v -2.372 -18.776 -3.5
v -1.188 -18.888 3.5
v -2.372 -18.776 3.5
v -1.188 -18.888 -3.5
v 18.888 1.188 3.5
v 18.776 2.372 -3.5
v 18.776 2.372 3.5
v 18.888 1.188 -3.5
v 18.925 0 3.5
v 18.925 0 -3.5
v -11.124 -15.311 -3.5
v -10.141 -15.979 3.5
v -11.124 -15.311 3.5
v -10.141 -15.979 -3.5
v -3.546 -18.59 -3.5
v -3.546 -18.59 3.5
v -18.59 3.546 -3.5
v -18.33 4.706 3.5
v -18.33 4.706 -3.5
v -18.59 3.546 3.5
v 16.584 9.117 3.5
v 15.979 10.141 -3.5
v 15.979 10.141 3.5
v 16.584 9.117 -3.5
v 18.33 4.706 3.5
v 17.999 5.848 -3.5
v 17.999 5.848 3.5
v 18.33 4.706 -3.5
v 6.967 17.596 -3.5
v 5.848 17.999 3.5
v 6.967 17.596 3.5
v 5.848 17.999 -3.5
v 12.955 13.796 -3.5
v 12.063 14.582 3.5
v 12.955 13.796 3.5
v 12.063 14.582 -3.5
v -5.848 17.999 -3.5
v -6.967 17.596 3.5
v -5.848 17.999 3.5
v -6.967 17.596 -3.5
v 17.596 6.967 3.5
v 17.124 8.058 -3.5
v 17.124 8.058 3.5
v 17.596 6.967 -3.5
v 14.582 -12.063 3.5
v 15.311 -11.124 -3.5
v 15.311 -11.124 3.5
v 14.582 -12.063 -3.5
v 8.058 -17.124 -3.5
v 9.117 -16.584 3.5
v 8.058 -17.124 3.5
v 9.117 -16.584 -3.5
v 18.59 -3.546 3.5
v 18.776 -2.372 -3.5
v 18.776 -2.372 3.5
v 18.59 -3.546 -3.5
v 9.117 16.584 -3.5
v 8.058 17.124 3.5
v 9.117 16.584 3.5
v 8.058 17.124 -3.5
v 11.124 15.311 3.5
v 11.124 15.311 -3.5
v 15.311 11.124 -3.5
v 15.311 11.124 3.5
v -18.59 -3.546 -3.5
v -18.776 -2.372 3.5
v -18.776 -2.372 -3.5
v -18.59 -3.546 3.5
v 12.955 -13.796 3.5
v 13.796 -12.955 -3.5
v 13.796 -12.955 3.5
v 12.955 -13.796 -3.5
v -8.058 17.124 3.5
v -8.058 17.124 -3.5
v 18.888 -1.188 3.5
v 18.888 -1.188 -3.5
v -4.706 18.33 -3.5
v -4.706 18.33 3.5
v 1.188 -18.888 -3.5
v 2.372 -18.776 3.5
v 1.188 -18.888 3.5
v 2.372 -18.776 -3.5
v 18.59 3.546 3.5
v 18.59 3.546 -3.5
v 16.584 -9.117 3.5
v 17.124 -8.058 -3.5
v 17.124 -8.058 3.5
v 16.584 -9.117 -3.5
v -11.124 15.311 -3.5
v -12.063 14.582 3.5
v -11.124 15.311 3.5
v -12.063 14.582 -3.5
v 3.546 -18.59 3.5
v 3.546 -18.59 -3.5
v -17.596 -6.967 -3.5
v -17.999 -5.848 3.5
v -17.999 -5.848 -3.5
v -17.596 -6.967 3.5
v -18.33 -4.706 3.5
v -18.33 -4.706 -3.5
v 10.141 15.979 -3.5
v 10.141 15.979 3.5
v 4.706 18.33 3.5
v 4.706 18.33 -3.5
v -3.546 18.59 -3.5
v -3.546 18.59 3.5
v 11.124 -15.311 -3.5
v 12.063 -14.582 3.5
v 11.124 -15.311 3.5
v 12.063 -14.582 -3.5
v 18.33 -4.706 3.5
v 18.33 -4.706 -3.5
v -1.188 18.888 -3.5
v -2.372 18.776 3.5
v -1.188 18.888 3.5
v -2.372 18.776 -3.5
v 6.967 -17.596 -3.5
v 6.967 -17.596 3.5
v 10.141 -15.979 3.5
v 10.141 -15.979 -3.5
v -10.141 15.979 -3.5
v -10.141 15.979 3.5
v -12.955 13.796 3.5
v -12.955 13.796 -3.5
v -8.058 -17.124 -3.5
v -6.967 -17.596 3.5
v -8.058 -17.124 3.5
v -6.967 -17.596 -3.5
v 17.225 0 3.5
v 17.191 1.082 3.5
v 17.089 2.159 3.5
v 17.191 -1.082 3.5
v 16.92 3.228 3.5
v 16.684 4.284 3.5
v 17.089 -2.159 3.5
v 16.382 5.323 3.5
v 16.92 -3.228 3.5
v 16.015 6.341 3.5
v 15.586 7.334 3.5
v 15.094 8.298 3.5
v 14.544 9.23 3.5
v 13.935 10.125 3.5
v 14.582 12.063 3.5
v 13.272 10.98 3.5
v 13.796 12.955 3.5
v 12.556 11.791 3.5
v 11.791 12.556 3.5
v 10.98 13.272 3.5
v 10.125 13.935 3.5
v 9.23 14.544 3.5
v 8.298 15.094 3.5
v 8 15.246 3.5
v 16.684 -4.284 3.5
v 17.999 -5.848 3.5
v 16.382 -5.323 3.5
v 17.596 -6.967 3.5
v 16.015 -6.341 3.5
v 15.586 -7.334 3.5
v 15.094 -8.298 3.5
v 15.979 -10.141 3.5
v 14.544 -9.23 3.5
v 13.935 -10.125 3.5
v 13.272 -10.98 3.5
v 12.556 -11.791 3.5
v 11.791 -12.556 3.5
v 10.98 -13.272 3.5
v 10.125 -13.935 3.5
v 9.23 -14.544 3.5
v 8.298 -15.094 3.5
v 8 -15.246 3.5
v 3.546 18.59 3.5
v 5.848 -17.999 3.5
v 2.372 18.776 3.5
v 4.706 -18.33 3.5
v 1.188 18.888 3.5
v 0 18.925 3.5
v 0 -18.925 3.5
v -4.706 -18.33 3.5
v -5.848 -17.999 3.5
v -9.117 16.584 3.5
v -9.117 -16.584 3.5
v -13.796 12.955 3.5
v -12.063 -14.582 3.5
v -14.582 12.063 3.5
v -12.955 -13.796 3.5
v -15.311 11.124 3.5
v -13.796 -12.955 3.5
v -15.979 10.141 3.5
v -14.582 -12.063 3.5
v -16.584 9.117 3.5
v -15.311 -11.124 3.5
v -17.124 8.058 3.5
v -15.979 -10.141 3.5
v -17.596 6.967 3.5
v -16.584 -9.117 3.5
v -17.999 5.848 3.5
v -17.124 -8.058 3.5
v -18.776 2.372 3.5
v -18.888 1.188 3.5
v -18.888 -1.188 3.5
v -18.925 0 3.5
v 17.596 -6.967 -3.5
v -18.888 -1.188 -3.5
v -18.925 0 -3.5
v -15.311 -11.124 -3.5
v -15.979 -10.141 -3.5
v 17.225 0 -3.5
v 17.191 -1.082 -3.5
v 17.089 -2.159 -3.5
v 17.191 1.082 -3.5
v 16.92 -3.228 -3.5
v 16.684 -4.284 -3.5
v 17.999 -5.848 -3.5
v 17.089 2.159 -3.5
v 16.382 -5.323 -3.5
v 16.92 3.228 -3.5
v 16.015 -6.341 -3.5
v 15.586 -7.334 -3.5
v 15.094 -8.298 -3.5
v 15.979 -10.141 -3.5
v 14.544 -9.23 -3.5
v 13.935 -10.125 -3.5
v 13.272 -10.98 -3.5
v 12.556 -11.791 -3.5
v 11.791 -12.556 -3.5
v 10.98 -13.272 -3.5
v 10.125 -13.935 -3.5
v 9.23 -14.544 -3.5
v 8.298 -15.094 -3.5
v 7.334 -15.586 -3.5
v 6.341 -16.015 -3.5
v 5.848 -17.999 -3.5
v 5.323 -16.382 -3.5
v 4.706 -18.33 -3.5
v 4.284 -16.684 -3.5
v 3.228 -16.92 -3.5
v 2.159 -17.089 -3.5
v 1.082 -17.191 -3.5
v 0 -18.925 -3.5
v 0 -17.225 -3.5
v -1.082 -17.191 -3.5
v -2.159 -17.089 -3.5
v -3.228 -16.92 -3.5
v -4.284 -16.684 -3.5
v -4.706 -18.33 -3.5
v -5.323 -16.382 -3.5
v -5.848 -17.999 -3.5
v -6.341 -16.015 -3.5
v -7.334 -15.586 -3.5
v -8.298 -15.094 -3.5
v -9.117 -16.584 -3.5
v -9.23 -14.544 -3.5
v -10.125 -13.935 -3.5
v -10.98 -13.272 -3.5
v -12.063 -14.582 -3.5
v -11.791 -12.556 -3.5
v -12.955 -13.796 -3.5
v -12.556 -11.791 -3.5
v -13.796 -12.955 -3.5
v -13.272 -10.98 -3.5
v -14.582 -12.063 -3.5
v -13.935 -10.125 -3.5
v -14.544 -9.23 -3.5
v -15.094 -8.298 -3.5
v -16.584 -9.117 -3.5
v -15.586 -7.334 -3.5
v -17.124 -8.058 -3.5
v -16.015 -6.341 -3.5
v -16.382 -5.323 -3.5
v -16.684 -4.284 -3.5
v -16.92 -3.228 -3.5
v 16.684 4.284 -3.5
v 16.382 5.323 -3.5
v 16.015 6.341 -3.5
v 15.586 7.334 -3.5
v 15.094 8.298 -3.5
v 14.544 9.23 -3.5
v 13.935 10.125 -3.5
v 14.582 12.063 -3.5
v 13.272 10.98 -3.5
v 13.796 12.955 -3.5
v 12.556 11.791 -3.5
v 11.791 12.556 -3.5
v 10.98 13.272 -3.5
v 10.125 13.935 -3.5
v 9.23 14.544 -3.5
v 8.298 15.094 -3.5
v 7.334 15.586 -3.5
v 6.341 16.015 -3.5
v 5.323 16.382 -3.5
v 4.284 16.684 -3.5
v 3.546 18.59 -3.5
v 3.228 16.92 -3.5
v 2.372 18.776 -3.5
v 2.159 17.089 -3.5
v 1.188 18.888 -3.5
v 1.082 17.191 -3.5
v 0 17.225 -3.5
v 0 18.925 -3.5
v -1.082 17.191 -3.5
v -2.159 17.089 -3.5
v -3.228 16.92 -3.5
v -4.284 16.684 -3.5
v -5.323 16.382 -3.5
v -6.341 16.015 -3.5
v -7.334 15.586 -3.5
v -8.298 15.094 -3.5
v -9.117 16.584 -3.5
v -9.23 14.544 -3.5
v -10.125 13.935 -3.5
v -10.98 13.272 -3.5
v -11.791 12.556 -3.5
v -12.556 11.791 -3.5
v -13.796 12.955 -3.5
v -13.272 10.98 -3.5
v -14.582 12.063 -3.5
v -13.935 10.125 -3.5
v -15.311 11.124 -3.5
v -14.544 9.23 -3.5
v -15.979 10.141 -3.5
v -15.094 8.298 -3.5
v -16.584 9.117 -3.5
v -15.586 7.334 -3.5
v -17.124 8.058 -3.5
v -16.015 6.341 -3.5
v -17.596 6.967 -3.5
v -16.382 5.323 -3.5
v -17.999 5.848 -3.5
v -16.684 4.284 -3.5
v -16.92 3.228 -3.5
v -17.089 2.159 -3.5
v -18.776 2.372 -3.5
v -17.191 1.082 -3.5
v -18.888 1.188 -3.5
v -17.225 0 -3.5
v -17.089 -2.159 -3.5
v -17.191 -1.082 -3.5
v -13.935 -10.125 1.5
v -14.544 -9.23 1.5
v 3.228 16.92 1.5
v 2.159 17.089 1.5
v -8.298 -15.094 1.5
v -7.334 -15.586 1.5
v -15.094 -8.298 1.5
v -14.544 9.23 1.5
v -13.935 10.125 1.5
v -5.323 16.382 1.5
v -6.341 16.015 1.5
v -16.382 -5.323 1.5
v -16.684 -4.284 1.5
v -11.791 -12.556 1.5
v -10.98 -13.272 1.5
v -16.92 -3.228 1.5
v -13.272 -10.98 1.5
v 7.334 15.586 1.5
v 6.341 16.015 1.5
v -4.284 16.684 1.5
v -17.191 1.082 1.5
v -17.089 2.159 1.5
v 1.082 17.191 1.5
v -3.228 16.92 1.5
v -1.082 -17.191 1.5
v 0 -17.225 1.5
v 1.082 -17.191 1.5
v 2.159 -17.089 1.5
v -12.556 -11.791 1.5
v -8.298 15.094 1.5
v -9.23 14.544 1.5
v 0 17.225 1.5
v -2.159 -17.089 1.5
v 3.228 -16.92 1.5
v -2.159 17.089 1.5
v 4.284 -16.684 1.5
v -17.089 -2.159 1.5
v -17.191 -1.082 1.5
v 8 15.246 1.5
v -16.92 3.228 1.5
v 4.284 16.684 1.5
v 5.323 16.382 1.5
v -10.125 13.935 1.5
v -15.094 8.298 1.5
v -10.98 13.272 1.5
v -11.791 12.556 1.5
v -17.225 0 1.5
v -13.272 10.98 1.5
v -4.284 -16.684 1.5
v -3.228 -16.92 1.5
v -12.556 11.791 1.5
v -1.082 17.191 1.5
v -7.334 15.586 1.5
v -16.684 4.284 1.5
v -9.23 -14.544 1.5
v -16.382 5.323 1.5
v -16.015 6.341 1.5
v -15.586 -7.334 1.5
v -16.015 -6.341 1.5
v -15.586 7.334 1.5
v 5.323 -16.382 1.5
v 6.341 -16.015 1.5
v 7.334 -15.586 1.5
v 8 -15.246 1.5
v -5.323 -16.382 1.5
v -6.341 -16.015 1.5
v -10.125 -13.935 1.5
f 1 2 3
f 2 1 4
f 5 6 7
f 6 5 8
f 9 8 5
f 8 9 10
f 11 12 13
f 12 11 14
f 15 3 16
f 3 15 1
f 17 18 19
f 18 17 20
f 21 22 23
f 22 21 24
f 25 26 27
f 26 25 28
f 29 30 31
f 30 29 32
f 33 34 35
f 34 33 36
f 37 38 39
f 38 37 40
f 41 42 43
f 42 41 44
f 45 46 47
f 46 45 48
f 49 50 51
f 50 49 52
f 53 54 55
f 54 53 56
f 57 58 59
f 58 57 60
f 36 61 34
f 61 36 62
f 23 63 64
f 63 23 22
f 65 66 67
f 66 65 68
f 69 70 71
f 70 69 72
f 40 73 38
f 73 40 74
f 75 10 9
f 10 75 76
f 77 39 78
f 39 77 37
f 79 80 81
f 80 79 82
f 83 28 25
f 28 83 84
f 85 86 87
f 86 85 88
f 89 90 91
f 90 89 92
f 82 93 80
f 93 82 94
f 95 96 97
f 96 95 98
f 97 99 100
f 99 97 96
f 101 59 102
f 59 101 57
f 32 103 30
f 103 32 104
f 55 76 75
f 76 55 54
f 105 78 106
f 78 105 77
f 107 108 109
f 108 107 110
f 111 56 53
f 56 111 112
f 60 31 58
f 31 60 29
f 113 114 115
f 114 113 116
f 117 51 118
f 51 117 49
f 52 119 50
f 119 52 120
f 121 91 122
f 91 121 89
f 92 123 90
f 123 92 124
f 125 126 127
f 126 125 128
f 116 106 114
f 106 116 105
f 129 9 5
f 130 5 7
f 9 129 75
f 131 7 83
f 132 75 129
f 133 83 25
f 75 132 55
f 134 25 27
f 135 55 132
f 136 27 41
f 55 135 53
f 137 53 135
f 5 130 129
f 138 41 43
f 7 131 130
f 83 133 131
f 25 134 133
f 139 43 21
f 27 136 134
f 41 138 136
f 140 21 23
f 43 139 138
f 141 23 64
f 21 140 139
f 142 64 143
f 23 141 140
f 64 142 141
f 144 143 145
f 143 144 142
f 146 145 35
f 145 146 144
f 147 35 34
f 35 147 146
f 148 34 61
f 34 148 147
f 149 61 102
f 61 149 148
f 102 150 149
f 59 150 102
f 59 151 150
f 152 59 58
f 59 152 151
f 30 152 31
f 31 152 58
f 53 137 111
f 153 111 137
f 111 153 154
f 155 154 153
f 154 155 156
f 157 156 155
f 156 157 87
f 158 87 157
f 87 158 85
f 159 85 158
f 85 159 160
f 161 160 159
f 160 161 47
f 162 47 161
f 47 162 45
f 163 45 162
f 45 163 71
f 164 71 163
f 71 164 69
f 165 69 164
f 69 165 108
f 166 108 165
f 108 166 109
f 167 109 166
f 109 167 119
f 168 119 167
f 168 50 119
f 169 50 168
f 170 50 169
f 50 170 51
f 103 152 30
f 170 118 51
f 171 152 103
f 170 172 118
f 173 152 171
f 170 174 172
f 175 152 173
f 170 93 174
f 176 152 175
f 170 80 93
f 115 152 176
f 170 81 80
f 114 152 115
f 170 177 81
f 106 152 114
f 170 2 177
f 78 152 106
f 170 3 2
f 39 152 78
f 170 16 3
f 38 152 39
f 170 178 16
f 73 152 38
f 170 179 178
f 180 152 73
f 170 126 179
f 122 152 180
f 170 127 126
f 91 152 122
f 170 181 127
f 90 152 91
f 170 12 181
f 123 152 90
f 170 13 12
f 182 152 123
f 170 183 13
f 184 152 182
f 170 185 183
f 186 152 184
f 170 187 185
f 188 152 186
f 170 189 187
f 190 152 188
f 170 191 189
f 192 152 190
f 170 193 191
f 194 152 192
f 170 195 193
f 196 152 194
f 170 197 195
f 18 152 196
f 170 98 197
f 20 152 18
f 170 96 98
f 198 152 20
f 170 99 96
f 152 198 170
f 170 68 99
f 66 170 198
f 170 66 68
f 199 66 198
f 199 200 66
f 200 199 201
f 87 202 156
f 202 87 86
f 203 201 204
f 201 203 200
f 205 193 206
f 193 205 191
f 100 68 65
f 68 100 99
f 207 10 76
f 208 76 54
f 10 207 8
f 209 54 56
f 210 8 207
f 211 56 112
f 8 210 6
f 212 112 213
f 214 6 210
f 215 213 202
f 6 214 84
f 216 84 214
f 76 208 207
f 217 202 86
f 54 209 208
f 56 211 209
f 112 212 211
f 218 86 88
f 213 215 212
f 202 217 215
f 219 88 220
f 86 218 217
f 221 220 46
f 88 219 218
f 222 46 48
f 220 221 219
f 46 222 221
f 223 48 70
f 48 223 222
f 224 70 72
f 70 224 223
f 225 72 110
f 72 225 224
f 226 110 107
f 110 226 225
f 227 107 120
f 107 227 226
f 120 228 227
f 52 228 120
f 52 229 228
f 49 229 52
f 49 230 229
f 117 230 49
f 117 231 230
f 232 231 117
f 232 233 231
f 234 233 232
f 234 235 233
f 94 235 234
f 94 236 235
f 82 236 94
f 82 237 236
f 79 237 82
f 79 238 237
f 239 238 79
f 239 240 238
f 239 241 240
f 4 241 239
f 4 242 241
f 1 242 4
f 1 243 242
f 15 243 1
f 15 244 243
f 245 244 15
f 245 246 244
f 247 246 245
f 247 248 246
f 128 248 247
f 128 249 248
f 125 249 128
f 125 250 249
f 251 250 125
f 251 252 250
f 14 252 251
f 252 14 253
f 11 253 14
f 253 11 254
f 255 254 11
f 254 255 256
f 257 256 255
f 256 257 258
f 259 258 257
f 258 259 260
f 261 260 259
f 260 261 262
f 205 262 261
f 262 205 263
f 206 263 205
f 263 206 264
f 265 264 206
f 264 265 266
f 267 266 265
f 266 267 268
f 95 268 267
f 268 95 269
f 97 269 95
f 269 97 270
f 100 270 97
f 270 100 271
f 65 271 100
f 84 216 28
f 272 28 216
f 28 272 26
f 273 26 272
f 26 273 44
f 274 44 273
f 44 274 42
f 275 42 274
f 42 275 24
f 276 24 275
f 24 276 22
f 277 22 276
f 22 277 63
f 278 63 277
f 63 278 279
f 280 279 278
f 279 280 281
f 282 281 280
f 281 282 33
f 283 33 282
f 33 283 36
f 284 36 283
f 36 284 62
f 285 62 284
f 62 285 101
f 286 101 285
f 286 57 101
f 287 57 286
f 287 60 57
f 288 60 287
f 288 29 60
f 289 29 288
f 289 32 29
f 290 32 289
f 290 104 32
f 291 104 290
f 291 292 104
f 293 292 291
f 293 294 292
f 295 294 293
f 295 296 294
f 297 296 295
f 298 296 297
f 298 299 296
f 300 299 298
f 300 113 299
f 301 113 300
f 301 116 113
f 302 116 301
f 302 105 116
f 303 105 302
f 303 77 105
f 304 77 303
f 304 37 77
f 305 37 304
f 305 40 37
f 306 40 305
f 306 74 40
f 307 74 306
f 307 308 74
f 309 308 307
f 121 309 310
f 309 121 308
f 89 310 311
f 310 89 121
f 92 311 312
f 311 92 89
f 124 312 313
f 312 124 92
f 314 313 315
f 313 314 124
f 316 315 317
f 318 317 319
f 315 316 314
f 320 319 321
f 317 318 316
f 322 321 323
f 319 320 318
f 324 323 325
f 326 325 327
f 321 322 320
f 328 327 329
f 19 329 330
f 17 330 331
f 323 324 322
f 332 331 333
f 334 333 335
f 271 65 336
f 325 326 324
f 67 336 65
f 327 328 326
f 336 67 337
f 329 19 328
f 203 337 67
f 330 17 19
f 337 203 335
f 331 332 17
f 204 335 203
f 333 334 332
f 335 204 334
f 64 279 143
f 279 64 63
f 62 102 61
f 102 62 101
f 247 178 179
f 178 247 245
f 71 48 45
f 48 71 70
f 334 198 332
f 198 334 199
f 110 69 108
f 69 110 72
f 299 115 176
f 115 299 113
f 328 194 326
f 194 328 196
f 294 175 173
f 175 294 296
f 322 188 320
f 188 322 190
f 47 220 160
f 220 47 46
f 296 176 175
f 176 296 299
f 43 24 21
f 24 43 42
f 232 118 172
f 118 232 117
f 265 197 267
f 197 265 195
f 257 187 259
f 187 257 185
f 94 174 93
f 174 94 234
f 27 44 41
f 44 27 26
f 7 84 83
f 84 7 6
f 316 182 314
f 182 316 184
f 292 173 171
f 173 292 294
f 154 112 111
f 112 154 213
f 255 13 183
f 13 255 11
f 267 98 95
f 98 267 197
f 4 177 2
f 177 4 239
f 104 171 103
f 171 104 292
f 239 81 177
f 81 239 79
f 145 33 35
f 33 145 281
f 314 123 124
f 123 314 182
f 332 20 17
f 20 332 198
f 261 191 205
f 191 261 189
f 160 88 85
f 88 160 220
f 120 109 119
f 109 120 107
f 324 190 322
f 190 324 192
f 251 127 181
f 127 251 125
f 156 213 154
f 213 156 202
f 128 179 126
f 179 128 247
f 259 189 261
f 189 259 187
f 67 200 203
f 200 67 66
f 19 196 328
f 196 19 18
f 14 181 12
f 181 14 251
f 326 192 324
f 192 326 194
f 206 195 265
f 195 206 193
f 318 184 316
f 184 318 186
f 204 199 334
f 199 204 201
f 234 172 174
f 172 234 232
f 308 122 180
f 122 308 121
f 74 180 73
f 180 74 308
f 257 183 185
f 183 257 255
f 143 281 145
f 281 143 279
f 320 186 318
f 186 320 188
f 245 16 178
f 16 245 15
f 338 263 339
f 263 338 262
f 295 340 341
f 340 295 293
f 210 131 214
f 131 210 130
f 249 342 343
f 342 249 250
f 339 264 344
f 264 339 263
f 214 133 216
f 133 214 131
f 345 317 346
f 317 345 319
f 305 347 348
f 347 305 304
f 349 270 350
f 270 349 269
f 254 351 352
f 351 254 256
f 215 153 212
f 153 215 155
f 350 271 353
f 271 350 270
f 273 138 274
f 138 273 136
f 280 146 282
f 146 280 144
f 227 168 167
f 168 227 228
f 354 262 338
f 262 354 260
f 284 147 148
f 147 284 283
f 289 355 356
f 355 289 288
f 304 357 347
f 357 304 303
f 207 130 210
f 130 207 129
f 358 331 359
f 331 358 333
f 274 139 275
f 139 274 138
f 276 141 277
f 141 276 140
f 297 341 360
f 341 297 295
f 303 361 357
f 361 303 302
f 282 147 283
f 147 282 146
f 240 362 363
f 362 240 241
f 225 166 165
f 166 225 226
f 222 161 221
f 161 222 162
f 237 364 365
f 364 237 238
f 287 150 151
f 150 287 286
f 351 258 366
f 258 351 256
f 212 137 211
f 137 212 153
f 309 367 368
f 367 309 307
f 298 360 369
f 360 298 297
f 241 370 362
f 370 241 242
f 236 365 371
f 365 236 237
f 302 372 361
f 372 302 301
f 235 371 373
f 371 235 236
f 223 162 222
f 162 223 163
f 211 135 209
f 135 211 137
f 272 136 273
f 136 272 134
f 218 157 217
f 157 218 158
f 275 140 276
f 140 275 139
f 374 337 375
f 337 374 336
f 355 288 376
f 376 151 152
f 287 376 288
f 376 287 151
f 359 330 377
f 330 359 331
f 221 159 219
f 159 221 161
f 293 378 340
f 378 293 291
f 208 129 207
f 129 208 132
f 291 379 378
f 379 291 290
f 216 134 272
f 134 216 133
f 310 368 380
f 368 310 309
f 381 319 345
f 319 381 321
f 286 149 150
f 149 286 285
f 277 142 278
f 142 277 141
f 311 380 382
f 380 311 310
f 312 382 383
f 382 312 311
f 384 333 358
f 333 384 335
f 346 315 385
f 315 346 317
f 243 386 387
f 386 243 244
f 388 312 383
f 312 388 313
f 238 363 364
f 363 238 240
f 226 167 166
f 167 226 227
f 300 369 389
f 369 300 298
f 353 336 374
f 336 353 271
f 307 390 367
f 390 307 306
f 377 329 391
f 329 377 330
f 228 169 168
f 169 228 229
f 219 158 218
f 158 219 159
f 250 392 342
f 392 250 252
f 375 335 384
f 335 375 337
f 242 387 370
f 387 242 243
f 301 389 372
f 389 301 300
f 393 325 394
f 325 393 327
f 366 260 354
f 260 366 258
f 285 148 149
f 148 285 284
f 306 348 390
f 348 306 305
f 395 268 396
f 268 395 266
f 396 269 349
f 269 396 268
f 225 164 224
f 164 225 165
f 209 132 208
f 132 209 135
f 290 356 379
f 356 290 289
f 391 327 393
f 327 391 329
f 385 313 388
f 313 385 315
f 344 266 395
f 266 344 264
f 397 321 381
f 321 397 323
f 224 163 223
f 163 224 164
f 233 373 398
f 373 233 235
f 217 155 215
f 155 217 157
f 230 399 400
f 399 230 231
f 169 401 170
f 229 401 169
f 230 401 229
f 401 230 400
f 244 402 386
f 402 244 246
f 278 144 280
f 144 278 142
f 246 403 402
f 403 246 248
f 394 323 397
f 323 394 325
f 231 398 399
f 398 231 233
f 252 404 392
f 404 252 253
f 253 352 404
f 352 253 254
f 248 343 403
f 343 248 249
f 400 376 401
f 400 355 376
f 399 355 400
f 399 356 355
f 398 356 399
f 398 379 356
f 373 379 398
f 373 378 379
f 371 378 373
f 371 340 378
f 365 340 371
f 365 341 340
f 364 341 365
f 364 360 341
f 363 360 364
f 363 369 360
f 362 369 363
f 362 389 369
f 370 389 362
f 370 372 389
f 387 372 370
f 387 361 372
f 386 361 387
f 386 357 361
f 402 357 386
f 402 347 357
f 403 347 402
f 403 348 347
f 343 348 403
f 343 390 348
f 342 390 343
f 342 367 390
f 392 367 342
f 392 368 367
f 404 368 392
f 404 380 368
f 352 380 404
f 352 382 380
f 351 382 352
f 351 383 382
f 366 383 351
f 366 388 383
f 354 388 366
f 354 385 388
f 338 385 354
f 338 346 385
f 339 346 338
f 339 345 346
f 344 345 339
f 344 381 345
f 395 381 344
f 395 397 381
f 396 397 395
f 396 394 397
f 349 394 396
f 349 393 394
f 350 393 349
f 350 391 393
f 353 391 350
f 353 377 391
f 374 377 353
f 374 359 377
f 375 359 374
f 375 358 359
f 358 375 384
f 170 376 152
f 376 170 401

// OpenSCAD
include <./ready.scad>;

OUTER_D = 44.45;
CAP_D = 57.15;
WALL_THICKNESS = 3;
LENGTH = 95.25;
$fn = 100;

module rail_neg () {
    cube([17.4, 4, 120], center = true);
    cube([35, 4, 95], center = true);
    
    translate([17.4, -1.5, 0]) cube([17.5, 4, 96], center = true);
    translate([-17.4, -1.5, 0]) cube([17.5, 4, 96], center = true);
}

module rail_guide () {
    translate([10.2, 0, 0]) cube([3, 4, 72], center = true);
    translate([-10.2, 0, 0]) cube([3, 4, 72], center = true);
    translate([10.2 - .6, 1.5, 0]) cube([4.3, 1, 72], center = true);
    translate([-10.2 + .6, 1.5, 0]) cube([4.3, 1, 72], center = true);
}

module fan_holes () {
        dist = 29;
        cylinder(r = 34/2, h = 500, center = true);
        translate([dist/2, dist/2, 0]) cylinder(r = 2.9/2, h = 500, center = true);
        translate([dist/2, -dist/2, 0]) cylinder(r = 2.9/2, h = 500, center = true);
        //translate([-dist/2, -dist/2, 0]) cylinder(r = 2.9/2, h = 500, center = true);
        translate([-dist/2 + 2.1, -dist/2 + 2.1, 0]) rotate([0, 0, 45]) cube([5, 5, 500], center = true);
        translate([-dist/2, dist/2, 0]) cylinder(r = 2.9/2, h = 500, center = true);
}

module light_holder (DECOYS = false) {
	//cap
    $fn = 200;
    difference () {
        translate([0,0,(LENGTH / 2) + (WALL_THICKNESS / 2) ]) {
            cylinder(r = CAP_D / 2, h = WALL_THICKNESS, center = true);
        }
        translate([0, 22, 0]) rail_neg();
        fan_holes();
    }
     
	//tube
	difference () {
		cylinder(r = OUTER_D / 2, h = LENGTH, center = true);
		cylinder(r = (OUTER_D / 2) - WALL_THICKNESS, h = LENGTH + 10, center = true);
        translate([0, 22, 0]) rail_neg();
        //light
        translate([0, 20, -41 + 6]) rotate([90, 0, 0]) cylinder(r = 13/2, h = 25, center = true);
	}
	//rail
    translate([0, 20.5, 12]) rail_guide();
    if (DECOYS) {
        decoys(36, 48.6, 6);
    }
}
module rail (DECOYS = false) {
    difference () {
       union () {
        translate([0, 20.7, 2.4]) cube([17, 1.3, 100], center = true);
        translate([0, 21.9, 2.4]) cube([14.2, 2.8, 100], center = true);
       }
       translate([0, 20, -41 + 6]) rotate([90, 0, 0]) cylinder(r = 9/2, h = 25, center = true);
       translate([0, 23.4, -41 + 6]) rotate([90, 0, 0]) cylinder(r = 13/2, h = 3, center = true);
    }
   translate([0, 24, 52.2]) cube([24, 8, 3], center = true);
    if (DECOYS) {
        translate([0, 0, -35]) rotate([90, 45, 0]) decoys(25, -22.05);
        translate([0, 0, 42]) rotate([90, 45, 0]) decoys(25, -22.05);
    }
};

module baffle (DECOYS = false) {
    //print 3 of these
    difference () {
		cylinder(r = (OUTER_D / 2) - WALL_THICKNESS - 0.3, h = 7, center = true);
        cylinder(r = (OUTER_D / 2) - WALL_THICKNESS - 2, h = 8, center = true);
	}
    difference () {
        translate([0, 0, 2.5]) cylinder(r = (OUTER_D / 2) - WALL_THICKNESS - 0.3, h = 2, center = true);
        translate([58, 0, 0]) cube([100, 100, 100], center = true);
    }
    if (DECOYS) {
            decoys(28, 1.5, 6);
    }
}

module LED_mount () {
    $fn = 200;
    difference () {
        cylinder(r = (OUTER_D / 2) - WALL_THICKNESS - 0.015, h = 10, center = true);
        cylinder(r = (OUTER_D / 2) - WALL_THICKNESS - 0.015 - 2, h = 11, center = true);
        translate([0, (OUTER_D / 2) +4, 0]) cube([OUTER_D, OUTER_D, OUTER_D], center = true);
    }
    translate ([0, 0, -4.5]) {
        intersection() {
            difference () {
                cylinder(r = (OUTER_D / 2) - WALL_THICKNESS - 0.015, h = 15, center = true);
                cylinder(r = (OUTER_D / 2) - WALL_THICKNESS - 0.015 - 2, h = 16, center = true);
            }
           translate ([0, -17, -1]) cube([7, 7, 15], center = true); 
        }
    }
    difference () {
        union () {
            difference () {
                translate([0, -6, 0]) cube([OUTER_D - 8, 2, 10], center = true);
                translate([OUTER_D / 2 - 3.5, -6.5, 0]) rotate([0, 0, 60]) cube([4, 2, 10], center = true);
                translate([-OUTER_D / 2 + 3.5, -6.5, 0]) rotate([0, 0, -60]) cube([4, 2, 10], center = true);
            }
            translate([7.5, -5, 0]) cube([4, 4, 10], center = true);
            translate([-7.5, -5, 0]) cube([4, 4, 10], center = true);
        }
        translate([7.5, 0, 0]) rotate([90, 0, 0]) cylinder(r = 1, h = 40, center = true);
        translate([0, 0, 0]) rotate([90, 0, 0]) cylinder(r = 1, h = 40, center = true);
        translate([-7.5, 0, 0]) rotate([90, 0, 0]) cylinder(r = 1, h = 40, center = true);
    }
    translate([0, -8, 0]) scale([1.5, 1, 1]) decoys(20, 3);
}

//rail(true);
/*difference() {
    light_holder(false);
    //translate([0, 0, -36]) LED_mount();
    translate([0, 0, 60]) cube([200, 200, 200], center = true);
}
decoys(30, -45.64, 6);*/

baffle();
